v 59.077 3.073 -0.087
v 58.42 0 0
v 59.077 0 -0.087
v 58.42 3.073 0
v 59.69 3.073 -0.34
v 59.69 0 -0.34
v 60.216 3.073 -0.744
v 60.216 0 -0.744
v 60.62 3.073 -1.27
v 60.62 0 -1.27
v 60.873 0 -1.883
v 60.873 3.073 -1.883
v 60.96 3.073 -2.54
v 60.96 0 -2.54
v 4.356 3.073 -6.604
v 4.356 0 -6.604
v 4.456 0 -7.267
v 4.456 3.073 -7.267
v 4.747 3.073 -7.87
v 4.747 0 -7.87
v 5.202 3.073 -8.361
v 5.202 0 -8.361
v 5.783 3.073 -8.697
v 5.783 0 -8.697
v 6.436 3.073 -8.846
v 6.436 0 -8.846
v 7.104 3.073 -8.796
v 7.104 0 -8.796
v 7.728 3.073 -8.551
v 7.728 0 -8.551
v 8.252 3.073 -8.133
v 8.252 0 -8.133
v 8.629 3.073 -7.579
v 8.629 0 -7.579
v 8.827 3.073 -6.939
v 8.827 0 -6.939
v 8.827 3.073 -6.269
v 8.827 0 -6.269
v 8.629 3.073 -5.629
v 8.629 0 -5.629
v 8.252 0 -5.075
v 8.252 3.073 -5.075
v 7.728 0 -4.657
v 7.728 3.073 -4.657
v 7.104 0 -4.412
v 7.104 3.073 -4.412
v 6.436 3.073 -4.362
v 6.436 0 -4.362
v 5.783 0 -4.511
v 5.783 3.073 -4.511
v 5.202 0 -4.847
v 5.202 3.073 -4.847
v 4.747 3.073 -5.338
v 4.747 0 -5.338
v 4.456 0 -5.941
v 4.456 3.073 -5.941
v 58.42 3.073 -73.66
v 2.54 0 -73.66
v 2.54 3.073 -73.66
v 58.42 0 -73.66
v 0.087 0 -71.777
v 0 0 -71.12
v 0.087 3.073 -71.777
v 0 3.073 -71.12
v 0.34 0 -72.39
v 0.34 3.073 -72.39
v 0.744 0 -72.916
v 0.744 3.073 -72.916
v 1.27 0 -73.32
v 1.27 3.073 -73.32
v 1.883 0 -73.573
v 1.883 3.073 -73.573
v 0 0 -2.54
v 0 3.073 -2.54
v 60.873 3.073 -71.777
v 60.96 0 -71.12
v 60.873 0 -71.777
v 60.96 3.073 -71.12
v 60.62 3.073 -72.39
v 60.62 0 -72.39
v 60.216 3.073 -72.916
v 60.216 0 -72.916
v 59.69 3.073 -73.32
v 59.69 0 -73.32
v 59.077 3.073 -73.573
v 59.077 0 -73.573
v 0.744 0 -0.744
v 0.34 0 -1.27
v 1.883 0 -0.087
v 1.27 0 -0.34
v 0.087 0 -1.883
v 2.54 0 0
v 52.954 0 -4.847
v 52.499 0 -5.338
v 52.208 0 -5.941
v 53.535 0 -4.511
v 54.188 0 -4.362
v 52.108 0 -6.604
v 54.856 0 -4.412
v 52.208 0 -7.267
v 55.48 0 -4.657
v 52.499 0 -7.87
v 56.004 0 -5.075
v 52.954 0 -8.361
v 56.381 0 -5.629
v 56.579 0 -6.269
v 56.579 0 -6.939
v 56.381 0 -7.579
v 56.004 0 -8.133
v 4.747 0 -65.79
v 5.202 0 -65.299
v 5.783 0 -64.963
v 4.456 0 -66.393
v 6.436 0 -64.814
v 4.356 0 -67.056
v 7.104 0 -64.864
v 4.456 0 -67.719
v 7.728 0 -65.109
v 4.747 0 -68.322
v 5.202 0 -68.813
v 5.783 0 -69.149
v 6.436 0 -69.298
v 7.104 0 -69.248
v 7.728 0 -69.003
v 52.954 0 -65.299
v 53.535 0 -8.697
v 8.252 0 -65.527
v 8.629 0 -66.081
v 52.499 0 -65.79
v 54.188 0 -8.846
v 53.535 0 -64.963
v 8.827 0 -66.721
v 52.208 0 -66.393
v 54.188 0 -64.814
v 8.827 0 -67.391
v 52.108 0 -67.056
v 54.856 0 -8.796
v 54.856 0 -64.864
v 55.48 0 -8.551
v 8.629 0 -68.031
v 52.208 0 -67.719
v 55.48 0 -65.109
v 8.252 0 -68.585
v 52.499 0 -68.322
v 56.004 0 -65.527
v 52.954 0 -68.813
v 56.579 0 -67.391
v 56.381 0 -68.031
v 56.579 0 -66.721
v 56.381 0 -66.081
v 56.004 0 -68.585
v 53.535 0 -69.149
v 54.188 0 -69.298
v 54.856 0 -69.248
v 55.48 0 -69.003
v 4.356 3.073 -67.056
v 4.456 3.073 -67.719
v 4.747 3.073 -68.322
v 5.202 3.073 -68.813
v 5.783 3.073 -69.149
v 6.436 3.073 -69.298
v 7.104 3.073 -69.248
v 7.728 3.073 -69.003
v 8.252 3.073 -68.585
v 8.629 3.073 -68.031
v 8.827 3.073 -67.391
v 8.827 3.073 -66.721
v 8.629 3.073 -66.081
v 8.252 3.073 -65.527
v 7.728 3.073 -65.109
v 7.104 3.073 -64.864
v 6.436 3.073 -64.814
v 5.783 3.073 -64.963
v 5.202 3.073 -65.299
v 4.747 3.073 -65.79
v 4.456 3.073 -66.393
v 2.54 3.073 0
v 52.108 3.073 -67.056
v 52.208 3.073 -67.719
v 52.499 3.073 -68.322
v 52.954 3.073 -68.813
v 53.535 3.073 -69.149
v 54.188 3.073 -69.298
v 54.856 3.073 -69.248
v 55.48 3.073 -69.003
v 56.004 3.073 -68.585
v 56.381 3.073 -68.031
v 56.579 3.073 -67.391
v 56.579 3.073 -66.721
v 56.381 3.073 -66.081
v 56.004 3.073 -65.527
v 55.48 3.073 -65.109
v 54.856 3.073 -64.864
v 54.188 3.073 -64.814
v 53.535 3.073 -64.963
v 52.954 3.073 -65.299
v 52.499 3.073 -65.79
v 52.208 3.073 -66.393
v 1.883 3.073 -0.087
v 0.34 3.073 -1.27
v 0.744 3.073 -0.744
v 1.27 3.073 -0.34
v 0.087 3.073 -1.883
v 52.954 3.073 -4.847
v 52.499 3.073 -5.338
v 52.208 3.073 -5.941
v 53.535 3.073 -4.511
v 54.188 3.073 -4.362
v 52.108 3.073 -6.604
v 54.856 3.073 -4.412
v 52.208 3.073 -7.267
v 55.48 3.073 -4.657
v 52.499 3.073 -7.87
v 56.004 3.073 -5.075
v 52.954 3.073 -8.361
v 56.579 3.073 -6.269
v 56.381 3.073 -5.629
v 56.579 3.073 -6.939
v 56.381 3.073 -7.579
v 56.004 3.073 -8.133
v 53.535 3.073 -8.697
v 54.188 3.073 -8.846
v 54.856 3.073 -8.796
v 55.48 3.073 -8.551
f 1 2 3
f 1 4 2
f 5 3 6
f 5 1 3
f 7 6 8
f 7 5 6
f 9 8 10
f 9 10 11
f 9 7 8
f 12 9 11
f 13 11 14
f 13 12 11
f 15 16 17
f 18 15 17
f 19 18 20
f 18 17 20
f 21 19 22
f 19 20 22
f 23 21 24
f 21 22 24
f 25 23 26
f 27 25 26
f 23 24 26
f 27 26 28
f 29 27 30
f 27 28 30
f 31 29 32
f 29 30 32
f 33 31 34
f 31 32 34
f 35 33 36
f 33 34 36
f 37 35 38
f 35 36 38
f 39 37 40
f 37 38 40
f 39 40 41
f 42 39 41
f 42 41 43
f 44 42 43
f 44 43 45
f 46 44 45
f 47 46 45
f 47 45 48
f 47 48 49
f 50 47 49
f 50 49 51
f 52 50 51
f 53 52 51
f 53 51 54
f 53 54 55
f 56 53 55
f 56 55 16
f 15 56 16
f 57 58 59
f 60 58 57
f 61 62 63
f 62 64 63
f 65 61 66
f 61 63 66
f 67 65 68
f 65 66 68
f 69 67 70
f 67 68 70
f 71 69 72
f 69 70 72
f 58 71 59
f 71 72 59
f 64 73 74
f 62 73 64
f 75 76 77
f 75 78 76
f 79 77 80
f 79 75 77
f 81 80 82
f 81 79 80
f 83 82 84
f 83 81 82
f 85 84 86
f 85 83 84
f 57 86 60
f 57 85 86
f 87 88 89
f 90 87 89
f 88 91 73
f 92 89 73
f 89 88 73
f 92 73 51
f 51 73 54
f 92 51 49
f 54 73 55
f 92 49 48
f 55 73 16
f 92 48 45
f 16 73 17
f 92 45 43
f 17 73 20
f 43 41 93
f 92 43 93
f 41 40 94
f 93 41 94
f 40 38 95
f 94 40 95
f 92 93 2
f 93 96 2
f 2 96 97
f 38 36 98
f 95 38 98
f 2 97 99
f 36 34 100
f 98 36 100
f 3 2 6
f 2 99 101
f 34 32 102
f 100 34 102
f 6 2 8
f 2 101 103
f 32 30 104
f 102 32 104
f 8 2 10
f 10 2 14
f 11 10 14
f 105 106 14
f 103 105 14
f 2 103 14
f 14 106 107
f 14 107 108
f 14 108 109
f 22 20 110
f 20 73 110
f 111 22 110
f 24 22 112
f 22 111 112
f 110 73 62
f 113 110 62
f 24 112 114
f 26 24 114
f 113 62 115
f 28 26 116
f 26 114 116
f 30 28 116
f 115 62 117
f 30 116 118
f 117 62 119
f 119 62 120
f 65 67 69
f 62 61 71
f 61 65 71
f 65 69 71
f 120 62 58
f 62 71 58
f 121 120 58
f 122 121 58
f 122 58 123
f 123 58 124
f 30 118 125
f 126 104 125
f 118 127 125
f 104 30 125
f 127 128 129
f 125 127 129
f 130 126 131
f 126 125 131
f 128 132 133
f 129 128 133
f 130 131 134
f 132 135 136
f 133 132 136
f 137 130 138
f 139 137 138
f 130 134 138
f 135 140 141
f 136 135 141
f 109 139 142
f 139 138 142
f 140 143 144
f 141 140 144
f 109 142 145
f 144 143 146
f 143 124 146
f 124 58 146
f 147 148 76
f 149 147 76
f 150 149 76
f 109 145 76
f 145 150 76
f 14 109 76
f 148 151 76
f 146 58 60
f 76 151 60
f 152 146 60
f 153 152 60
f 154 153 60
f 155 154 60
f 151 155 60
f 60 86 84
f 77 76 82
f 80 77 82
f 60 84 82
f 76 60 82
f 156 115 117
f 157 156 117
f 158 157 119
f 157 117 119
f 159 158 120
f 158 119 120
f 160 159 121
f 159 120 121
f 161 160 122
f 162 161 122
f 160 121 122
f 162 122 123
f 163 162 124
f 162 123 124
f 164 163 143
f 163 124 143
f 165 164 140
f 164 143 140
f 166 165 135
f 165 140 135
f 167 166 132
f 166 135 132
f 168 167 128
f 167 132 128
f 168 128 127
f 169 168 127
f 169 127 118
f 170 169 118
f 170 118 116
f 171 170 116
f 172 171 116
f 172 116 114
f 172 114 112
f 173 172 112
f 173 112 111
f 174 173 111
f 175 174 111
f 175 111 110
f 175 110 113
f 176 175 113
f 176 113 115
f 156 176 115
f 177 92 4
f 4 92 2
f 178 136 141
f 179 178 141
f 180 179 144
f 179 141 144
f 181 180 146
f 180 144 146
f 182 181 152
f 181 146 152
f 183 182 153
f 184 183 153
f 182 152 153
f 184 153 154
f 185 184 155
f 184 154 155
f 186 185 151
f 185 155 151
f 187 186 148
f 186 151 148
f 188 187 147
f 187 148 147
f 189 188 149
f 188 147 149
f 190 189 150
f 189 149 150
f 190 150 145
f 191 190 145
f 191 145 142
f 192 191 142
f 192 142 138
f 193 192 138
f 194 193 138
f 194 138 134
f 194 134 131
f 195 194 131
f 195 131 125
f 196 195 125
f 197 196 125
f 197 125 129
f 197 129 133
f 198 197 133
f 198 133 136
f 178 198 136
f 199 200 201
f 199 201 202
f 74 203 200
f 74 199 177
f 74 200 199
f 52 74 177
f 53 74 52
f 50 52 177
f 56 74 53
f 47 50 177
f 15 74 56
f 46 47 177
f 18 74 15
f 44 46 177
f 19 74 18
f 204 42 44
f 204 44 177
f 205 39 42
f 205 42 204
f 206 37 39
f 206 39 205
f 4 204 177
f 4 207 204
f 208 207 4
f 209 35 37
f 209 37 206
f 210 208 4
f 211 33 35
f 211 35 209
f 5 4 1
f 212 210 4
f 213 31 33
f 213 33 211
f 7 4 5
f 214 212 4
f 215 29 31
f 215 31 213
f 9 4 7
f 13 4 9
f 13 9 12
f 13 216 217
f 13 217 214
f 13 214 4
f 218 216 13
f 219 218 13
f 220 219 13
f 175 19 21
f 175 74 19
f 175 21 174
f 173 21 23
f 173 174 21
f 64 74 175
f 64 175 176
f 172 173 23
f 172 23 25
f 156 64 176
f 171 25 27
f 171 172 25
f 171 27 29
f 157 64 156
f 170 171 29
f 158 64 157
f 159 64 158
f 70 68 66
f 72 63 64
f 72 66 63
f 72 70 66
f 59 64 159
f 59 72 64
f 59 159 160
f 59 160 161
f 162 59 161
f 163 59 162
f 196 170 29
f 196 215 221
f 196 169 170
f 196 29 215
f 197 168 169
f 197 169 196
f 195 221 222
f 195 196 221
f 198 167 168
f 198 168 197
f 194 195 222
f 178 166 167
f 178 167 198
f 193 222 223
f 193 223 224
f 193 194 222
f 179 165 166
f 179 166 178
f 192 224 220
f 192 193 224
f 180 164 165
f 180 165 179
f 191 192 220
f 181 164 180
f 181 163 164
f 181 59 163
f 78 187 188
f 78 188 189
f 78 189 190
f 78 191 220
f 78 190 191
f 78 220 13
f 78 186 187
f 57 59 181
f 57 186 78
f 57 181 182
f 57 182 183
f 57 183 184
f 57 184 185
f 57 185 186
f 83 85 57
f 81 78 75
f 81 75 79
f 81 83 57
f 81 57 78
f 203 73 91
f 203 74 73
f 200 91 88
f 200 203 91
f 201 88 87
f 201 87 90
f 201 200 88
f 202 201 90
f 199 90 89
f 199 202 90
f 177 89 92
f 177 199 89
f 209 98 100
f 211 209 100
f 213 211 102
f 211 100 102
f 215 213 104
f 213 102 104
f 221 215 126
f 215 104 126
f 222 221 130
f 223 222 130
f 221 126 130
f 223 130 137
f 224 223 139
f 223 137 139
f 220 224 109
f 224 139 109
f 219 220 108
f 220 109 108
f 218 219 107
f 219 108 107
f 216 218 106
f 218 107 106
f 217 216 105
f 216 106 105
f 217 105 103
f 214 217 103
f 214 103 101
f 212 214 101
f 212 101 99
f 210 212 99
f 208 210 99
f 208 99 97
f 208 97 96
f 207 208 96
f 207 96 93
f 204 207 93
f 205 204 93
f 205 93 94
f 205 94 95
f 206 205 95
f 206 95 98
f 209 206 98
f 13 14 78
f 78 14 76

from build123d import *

# Parameters (mm, degrees)
SKETCH1_W             = 60.96
SKETCH1_H             = 73.66
BOSS_EXTRUDE1_DEPTH   = 3.0734
FILLET1_R             = 2.54
F_8_CLEARANCE_HOLE1_D = 4.4958


with BuildPart() as part:
    # Sketch1 → Boss-Extrude1 (new body)
    with BuildSketch(Plane(origin=(0, 0, 0), x_dir=(1, 0, 0), z_dir=(0, 1, 0))):
        with Locations((30.48, 36.83)):
            Rectangle(SKETCH1_W, SKETCH1_H)
    extrude(amount=BOSS_EXTRUDE1_DEPTH)

    # Fillet1
    fillet1_edges = [part.edges().sort_by_distance(p)[0] for p in [
        (0, 1.5367, -73.66),
        (60.96, 1.5367, -73.66),
        (60.96, 1.5367, 0),
        (0, 1.5367, 0),
    ]]
    fillet(fillet1_edges, radius=FILLET1_R)

    # #8 Clearance Hole1 (through all)
    with Locations(Plane(origin=(0, 3.0734, 0), x_dir=(1, 0, 0), z_dir=(0, 1, 0))):
        with Locations((54.356, 67.056), (54.356, 6.604), (6.604, 67.056), (6.604, 6.604)):
            Hole(F_8_CLEARANCE_HOLE1_D / 2)


solid = part.part
